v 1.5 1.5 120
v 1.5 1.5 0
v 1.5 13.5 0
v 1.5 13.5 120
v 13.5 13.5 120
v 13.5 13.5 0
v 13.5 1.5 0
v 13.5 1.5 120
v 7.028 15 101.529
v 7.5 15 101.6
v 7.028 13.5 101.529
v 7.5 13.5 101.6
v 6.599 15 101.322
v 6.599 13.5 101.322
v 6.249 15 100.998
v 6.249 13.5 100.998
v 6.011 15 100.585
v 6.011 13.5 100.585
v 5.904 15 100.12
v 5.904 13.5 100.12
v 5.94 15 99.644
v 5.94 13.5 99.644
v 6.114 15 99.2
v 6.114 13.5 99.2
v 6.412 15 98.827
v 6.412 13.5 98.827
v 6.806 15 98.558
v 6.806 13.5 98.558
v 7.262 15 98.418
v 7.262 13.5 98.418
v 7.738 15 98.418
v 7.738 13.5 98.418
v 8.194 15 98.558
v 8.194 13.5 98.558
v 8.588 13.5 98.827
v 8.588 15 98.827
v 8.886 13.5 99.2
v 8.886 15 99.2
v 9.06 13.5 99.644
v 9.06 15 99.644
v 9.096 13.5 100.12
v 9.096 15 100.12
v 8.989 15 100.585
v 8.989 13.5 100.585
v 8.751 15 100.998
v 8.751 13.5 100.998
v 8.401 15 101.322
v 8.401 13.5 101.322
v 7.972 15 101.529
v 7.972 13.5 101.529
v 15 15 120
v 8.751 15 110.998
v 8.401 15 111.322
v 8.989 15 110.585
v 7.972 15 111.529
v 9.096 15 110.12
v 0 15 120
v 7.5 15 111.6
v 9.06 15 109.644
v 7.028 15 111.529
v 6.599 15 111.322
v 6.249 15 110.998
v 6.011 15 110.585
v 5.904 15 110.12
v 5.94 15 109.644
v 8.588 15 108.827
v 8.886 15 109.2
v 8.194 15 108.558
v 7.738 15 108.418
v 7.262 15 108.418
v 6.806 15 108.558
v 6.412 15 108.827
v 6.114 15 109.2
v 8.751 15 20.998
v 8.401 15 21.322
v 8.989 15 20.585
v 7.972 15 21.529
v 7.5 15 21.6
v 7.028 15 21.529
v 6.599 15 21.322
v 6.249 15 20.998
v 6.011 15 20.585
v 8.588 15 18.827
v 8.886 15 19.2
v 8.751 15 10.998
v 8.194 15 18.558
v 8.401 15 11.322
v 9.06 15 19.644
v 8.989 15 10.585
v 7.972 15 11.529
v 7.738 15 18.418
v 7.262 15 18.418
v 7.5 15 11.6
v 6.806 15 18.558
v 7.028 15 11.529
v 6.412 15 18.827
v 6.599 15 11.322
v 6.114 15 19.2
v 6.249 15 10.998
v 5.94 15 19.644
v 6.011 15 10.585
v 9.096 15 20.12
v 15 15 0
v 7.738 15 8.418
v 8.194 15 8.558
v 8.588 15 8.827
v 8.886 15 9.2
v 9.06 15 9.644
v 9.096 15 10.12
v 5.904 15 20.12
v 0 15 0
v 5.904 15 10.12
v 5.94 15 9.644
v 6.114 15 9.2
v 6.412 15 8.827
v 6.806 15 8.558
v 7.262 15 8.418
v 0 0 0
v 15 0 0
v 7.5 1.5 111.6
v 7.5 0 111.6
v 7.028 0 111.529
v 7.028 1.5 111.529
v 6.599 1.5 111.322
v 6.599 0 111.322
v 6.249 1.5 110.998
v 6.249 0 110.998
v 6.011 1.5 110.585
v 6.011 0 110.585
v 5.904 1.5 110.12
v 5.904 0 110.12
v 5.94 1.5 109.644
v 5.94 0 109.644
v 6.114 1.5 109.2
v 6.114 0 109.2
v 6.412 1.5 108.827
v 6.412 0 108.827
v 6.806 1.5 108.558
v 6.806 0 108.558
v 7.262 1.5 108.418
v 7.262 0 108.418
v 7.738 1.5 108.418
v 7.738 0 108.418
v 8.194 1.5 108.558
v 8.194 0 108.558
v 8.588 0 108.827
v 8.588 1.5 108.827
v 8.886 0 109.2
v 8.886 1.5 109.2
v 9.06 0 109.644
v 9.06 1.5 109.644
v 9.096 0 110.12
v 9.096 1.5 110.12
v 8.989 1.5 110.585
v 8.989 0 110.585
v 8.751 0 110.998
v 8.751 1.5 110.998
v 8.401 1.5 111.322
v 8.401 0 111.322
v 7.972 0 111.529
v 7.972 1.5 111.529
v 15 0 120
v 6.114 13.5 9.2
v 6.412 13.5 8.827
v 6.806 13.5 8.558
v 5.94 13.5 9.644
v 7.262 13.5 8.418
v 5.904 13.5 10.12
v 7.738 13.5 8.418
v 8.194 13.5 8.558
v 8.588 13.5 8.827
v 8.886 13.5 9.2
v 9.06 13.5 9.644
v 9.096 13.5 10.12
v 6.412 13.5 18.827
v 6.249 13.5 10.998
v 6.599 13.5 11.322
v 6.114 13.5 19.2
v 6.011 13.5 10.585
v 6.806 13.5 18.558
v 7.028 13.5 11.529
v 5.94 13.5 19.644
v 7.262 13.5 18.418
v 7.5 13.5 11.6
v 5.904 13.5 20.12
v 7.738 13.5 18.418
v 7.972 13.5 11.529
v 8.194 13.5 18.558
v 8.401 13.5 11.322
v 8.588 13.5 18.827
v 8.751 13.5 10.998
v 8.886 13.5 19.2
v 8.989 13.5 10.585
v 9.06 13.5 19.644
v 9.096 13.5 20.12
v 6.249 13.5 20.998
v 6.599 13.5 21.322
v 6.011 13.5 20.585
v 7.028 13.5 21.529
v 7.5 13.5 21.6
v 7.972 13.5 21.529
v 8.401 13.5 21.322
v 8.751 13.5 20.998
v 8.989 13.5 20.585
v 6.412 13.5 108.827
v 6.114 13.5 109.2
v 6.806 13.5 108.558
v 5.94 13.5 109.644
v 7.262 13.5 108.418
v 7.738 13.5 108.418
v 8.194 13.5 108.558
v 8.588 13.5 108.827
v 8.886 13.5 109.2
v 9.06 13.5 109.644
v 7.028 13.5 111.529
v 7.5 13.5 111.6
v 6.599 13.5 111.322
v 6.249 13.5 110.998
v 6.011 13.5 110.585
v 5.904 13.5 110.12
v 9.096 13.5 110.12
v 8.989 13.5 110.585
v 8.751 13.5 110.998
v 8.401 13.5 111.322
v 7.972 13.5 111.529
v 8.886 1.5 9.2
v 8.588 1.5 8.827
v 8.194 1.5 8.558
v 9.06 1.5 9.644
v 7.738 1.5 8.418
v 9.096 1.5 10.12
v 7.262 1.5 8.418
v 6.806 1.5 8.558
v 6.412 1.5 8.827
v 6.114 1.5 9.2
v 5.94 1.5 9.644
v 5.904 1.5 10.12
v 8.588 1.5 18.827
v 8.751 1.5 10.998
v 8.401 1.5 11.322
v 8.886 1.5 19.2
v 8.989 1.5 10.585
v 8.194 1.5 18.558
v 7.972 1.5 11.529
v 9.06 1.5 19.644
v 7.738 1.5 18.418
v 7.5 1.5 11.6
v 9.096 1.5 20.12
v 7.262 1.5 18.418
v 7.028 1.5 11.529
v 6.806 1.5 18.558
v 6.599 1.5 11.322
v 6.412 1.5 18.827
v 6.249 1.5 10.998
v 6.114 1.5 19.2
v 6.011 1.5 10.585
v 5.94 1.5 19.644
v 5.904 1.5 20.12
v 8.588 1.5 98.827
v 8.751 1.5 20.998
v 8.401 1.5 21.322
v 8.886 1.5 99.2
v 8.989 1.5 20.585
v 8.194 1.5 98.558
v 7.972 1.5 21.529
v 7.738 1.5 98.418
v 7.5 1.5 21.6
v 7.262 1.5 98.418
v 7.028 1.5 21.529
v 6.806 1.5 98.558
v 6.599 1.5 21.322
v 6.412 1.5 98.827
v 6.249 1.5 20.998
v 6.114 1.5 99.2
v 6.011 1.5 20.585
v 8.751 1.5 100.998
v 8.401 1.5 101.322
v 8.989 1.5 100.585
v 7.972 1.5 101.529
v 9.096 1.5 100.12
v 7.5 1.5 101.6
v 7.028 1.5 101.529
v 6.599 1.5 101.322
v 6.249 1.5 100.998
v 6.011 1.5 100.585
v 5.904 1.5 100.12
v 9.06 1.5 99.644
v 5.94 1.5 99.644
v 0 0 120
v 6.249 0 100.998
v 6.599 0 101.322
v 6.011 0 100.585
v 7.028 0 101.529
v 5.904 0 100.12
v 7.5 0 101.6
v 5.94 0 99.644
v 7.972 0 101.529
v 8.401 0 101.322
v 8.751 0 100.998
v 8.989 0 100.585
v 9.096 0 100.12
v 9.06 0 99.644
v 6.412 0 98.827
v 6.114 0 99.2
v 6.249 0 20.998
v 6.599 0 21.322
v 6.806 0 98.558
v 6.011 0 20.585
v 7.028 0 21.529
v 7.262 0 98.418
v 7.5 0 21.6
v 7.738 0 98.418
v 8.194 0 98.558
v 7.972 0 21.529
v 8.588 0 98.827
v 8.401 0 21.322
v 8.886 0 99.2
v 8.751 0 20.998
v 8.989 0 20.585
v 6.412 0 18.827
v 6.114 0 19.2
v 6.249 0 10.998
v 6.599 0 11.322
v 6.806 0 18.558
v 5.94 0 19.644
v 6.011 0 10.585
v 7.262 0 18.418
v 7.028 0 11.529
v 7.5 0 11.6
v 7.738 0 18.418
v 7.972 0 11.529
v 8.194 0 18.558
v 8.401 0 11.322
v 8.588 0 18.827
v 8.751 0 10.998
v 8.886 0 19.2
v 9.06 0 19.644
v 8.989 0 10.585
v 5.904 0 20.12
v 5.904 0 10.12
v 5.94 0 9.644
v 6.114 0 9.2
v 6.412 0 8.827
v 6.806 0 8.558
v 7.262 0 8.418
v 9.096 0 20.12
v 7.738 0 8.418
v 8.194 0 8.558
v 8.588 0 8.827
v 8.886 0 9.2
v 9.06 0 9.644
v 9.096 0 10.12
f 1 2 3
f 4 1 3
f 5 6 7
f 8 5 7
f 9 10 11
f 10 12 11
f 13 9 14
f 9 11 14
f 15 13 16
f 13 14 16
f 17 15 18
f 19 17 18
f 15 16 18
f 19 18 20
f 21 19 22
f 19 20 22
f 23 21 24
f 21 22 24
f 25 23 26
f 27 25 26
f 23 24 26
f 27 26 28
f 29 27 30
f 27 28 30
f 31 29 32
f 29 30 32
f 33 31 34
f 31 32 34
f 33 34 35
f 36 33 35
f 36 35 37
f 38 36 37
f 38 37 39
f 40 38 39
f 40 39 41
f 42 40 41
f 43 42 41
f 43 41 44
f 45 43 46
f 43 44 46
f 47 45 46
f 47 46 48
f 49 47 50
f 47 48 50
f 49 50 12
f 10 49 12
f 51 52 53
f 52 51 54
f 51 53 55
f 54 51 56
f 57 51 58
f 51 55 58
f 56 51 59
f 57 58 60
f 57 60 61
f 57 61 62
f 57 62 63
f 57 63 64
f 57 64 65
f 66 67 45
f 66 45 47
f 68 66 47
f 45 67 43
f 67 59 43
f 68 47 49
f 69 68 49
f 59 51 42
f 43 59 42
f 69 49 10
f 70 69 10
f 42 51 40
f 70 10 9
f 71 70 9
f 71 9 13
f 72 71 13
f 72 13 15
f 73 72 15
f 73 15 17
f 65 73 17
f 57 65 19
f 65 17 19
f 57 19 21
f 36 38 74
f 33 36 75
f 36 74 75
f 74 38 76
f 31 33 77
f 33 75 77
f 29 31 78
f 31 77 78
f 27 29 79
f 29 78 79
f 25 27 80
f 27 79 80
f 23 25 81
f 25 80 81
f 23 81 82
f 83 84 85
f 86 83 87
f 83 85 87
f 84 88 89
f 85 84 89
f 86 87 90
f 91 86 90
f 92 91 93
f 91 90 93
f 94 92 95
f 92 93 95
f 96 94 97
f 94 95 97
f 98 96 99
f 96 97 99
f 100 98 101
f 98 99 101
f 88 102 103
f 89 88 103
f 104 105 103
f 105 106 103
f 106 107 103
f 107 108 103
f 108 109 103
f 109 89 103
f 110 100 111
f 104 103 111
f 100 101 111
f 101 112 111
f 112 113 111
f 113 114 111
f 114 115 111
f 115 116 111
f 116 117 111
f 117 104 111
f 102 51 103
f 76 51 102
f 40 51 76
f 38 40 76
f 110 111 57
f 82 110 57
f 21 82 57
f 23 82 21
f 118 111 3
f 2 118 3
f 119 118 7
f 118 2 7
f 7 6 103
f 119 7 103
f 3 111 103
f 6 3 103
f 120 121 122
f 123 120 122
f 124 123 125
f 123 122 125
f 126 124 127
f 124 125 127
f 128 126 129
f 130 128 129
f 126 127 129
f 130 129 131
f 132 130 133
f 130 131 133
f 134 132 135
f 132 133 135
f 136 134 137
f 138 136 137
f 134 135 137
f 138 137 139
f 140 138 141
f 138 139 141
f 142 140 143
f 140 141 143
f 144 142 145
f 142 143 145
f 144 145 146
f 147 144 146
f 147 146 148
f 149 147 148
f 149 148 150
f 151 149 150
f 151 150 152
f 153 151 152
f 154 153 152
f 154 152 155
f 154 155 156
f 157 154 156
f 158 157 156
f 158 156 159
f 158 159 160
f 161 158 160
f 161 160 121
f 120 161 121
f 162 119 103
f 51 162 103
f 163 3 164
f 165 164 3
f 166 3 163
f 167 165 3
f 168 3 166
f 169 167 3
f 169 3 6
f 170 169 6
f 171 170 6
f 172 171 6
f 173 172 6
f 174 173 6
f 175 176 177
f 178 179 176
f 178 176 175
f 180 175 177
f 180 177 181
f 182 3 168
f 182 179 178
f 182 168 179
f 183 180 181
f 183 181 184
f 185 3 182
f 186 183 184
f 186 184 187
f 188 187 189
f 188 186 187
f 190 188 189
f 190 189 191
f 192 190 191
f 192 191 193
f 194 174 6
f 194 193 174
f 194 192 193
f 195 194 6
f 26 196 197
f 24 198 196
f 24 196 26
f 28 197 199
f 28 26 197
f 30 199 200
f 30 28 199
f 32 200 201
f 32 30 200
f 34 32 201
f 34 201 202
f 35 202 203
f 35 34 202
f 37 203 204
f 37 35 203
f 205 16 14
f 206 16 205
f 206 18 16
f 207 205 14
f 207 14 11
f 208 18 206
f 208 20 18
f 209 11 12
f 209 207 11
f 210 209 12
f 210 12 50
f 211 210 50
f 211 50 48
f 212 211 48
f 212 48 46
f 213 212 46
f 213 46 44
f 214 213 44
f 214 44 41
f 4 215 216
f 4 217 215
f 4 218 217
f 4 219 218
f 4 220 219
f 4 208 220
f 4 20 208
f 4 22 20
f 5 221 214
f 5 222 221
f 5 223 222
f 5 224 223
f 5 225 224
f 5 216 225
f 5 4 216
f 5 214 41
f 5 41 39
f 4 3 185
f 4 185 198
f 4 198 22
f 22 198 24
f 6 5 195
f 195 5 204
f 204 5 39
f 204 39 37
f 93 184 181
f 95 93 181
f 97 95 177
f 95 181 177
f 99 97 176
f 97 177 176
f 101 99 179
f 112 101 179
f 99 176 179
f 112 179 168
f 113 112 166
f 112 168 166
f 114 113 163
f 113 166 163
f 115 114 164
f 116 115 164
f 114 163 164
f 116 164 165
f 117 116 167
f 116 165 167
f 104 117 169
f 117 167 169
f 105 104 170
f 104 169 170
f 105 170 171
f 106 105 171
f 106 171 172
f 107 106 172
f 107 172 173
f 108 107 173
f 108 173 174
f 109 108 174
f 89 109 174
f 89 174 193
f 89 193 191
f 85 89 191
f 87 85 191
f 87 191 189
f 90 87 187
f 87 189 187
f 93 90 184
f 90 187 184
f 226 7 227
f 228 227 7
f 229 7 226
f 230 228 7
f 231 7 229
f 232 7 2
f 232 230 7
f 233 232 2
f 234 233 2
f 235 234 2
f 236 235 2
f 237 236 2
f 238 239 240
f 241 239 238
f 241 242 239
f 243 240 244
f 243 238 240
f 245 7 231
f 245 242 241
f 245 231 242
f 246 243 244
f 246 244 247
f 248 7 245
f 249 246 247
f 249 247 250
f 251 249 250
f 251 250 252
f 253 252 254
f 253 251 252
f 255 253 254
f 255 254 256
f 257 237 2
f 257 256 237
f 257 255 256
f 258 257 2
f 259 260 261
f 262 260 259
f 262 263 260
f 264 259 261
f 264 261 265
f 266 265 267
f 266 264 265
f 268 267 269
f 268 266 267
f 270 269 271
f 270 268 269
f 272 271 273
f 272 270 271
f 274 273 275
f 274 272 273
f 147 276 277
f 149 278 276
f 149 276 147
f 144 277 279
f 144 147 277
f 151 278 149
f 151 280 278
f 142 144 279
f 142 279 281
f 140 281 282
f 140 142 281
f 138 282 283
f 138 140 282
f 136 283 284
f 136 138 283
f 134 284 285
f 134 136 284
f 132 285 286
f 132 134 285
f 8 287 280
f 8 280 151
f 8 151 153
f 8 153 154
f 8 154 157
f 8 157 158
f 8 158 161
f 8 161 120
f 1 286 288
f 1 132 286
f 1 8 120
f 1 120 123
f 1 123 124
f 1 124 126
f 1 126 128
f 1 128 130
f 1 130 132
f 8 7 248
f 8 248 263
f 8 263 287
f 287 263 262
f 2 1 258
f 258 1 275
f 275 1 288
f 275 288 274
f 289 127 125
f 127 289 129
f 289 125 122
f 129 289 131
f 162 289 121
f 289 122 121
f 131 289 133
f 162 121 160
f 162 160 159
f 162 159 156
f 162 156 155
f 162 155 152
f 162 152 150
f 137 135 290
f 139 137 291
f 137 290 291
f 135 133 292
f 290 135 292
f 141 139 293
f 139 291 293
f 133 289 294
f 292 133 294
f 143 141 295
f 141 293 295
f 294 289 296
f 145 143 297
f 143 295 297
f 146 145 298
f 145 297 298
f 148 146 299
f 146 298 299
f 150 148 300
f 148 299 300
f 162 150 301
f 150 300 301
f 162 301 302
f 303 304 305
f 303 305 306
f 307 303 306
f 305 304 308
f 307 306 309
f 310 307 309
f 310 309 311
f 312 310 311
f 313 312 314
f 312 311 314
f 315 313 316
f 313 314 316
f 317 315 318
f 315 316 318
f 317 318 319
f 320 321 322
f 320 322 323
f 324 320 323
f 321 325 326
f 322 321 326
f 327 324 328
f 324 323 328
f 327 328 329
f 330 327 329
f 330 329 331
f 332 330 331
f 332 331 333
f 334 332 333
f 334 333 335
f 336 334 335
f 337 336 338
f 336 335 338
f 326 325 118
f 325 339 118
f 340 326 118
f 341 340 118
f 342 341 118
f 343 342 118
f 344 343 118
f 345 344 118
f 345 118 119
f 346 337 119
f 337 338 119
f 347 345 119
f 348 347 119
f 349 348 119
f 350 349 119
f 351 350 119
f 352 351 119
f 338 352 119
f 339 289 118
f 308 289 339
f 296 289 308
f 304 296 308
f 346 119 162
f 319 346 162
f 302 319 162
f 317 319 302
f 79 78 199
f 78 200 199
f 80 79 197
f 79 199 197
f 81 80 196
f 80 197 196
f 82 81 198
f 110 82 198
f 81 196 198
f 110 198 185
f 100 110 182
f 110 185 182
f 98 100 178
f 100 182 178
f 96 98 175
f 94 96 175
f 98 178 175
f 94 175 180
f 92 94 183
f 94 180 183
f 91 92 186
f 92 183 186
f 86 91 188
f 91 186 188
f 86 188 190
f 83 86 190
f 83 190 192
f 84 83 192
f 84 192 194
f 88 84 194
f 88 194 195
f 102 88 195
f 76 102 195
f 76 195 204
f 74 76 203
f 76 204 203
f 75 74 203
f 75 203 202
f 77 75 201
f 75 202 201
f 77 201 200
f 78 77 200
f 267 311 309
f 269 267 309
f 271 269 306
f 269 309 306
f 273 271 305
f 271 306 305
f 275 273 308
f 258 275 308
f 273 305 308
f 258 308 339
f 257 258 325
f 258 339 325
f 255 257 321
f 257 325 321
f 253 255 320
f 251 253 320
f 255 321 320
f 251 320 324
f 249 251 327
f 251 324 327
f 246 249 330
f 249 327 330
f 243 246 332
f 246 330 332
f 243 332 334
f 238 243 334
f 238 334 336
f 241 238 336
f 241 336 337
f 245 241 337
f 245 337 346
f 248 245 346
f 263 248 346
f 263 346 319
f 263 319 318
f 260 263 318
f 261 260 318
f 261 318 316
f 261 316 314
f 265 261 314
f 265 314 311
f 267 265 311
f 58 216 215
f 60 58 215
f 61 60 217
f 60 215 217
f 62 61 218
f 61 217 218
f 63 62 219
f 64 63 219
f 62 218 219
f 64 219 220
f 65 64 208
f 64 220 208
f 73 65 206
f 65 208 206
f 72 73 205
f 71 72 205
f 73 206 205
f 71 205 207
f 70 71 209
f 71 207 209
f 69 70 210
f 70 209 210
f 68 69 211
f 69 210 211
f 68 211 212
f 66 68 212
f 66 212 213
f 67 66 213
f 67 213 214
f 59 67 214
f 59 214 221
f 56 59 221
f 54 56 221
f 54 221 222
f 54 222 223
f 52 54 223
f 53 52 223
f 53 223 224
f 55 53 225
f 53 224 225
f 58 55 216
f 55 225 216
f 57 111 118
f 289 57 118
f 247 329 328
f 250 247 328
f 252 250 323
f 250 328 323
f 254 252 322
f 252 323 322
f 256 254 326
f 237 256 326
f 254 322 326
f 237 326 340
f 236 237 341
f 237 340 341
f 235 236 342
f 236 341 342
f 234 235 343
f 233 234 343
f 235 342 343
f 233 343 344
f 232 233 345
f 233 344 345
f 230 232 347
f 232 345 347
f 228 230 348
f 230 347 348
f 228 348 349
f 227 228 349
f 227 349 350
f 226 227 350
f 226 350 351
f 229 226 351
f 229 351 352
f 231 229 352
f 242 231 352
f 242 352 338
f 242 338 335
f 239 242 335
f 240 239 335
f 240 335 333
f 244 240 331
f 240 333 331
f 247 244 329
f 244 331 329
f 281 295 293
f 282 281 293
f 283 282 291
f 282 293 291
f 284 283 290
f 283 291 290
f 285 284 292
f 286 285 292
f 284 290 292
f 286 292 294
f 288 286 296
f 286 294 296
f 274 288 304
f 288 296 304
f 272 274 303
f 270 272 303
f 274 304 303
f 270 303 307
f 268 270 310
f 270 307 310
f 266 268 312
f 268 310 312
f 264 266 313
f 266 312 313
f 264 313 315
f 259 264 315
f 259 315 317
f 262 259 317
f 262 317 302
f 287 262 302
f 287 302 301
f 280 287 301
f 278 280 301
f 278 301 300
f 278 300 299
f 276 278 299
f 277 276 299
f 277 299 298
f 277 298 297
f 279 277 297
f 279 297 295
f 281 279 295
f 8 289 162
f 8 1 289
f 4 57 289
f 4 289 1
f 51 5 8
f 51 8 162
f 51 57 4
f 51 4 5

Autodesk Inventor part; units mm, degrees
ref_plane "YZ Plane" through (0, 0, 0) normal (1, 0, 0) x (0, 1, 0)
ref_plane "XZ Plane" through (0, 0, 0) normal (0, 1, 0) x (-1, 0, 0)
ref_plane "XY Plane" through (0, 0, 0) normal (0, 0, 1) x (1, 0, 0)
sketch "スケッチ1" plane through (0, 0, 0) normal (0, 0, 1) x (1, 0, 0)
  line L0 (0, 0) -> (15, 0)
  line L1 (15, 0) -> (15, 15)
  line L2 (15, 15) -> (0, 15)
  line L3 (0, 15) -> (0, 0)
  dimension "d0" = 15
  dimension "d1" = 15
extrude "押し出し1" add sketch "スケッチ1" along normal blind 120
sketch "スケッチ2" plane through (0, 15, 0) normal (0, 1, 0) x (1, 0, 0)
  line L0 (0, 0) -> (0, -120) projected
  line L1 (15, 0) -> (0, 0) projected
  line L2 (15, -120) -> (0, -120) projected
  point P0 (7.5, -10)
  point P1 (7.5, -20)
  point P2 (7.5, -110)
  point P3 (7.5, -100)
  dimension "d4" = 7.5
  dimension "d5" = 10
  dimension "d6" = 10
  dimension "d7" = 7.5
  dimension "d8" = 10
  dimension "d9" = 7.5
  dimension "d10" = 10
  dimension "d11" = 7.5
hole "穴1" at (7.5, 15, 10) at (7.5, 15, 20) at (7.5, 15, 110) at (7.5, 15, 100) direction (0, -1, 0) diameter 3.2 end through all
sketch "スケッチ3" plane through (0, 0, 120) normal (0, 0, 1) x (1, 0, 0)
  line L0 (1.5, 13.5) -> (13.5, 13.5)
  line L1 (13.5, 13.5) -> (13.5, 1.5)
  line L2 (13.5, 1.5) -> (1.5, 1.5)
  line L3 (1.5, 1.5) -> (1.5, 13.5)
  line L4 (15, 15) -> (0, 15) projected
  line L5 (0, 15) -> (0, 0) projected
  dimension "d19" = 12
  dimension "d20" = 12
  dimension "d21" = 1.5
  dimension "d22" = 1.5
extrude "押し出し2" cut sketch "スケッチ3" against normal blind 200
properties part number "射出_角柱9" material "アルミニウム 6061"
